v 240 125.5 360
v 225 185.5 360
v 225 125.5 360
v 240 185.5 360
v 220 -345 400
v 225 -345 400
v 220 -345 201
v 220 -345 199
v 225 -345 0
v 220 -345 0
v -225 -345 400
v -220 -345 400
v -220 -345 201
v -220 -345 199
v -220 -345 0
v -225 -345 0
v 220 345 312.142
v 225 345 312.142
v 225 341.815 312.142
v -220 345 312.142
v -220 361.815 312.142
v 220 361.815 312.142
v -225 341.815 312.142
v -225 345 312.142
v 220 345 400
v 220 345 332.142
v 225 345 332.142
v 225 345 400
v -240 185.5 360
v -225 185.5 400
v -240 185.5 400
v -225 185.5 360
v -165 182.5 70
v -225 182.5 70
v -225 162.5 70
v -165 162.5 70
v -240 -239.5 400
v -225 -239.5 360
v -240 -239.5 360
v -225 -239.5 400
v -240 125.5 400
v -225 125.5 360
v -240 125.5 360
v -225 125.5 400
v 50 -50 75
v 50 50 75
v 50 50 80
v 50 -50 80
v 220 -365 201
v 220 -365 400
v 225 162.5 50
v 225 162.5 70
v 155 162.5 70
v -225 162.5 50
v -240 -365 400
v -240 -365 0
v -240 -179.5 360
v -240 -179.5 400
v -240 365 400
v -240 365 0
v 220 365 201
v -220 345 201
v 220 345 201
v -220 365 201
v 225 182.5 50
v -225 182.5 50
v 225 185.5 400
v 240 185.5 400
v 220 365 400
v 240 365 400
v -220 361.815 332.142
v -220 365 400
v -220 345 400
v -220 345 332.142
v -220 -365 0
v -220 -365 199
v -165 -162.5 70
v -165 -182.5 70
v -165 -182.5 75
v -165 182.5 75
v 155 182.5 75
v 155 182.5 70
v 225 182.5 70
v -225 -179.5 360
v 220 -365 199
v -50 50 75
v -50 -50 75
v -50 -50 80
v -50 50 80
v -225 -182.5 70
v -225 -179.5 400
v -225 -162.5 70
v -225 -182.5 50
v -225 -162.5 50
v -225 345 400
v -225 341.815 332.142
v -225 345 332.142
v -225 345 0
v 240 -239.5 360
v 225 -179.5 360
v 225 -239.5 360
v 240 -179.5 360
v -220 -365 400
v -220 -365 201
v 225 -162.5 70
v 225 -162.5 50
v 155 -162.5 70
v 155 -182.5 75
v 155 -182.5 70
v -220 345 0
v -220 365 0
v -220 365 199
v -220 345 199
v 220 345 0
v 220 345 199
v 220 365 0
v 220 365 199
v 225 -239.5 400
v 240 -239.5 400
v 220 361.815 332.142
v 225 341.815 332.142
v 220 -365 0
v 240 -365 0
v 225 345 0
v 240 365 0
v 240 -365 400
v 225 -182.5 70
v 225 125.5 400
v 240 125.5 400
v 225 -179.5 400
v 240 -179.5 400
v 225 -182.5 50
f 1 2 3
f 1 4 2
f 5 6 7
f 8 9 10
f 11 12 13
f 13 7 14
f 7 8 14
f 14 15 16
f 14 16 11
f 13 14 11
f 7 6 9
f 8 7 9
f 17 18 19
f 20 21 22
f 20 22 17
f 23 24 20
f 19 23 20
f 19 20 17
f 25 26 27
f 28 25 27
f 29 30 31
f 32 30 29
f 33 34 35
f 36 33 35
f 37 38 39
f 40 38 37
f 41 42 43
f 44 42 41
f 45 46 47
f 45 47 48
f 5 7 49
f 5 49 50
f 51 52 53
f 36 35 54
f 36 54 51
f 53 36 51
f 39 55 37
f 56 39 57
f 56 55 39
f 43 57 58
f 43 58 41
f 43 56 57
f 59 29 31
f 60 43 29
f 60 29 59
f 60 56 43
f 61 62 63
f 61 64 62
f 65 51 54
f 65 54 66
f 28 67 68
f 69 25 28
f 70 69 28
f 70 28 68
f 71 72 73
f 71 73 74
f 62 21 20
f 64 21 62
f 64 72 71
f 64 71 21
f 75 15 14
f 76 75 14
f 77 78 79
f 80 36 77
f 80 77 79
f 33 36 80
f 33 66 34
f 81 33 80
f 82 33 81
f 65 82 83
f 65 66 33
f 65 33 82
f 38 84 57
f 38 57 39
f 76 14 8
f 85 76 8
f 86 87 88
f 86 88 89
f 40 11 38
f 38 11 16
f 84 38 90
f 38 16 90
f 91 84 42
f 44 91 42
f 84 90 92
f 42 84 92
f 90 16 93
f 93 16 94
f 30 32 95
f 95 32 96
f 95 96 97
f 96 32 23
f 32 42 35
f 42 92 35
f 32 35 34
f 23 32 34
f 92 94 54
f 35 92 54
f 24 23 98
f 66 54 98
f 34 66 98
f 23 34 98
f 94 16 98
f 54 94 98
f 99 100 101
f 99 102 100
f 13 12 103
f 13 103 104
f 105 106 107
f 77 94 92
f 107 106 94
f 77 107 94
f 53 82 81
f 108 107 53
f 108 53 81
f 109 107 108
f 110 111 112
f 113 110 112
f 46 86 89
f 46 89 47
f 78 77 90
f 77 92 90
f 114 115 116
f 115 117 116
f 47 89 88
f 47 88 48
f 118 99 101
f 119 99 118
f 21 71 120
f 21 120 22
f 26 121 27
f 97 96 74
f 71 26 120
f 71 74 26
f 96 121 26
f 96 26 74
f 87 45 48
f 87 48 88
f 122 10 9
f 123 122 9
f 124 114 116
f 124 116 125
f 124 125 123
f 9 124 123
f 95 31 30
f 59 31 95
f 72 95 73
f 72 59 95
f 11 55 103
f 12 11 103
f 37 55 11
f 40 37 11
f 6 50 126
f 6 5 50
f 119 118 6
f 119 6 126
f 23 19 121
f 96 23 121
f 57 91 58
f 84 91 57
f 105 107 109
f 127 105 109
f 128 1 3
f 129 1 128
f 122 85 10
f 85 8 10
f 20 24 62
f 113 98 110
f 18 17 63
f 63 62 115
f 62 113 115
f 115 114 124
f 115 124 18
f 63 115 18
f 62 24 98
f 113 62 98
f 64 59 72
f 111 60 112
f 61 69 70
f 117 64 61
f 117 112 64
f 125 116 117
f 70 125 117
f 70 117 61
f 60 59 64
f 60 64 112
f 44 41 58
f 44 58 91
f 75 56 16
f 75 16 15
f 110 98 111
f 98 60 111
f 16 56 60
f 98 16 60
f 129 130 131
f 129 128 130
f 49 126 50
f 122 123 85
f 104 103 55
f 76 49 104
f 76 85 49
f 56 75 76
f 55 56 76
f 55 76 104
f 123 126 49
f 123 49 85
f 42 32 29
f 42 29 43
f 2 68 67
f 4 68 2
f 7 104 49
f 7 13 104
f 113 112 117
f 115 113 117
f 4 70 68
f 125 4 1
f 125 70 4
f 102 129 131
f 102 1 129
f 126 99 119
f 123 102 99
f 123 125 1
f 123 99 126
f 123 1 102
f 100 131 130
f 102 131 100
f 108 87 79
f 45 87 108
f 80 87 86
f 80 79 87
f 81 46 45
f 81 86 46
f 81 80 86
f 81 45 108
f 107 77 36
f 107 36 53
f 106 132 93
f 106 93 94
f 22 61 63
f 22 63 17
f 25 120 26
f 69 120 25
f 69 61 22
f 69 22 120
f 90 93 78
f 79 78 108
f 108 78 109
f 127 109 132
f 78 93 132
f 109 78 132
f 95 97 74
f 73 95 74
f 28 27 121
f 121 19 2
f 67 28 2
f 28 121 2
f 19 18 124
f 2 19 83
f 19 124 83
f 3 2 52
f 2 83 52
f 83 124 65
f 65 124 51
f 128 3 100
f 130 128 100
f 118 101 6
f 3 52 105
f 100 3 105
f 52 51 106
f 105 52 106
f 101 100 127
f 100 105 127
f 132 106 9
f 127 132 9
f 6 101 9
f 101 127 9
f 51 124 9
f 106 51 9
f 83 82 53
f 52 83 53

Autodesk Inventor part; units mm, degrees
ref_plane "YZ Plane" through (0, 0, 0) normal (1, 0, 0) x (0, 1, 0)
ref_plane "XZ Plane" through (0, 0, 0) normal (0, 1, 0) x (-1, 0, 0)
ref_plane "XY Plane" through (0, 0, 0) normal (0, 0, 1) x (1, 0, 0)
sketch "Sketch1" plane through (0, 0, 0) normal (0, 0, 1) x (1, 0, 0)
  line L0 (-240, 365) -> (240, 365)
  line L1 (240, 365) -> (240, -365)
  line L2 (240, -365) -> (-240, -365)
  line L3 (-240, -365) -> (-240, 365)
  line L4 (-225, 345) -> (225, 345)
  line L5 (225, 345) -> (225, -345)
  line L6 (225, -345) -> (-225, -345)
  line L7 (-225, -345) -> (-225, 345)
  point P0 (0, 0)
  dimension "d0" = 480
  dimension "d1" = 730
  dimension "d2" = 450
  dimension "d3" = 690
extrude "Extrusion1" add sketch "Sketch1" along normal blind 400
sketch "Sketch2" plane through (-240, 365, 0) normal (0, 1, 0) x (1, 0, 0)
  line L0 (20, 0) -> (20, -199)
  line L1 (20, 0) -> (219, 0) construction
  line L2 (20, -199) -> (460, -199)
  line L3 (460, -199) -> (460, 0)
  line L4 (15, 0) -> (465, 0) projected
  line L5 (465, -400) -> (15, -400) projected
  line L6 (20, -400) -> (20, -201)
  line L7 (15, 0) -> (15, -400) projected
  line L8 (20, -201) -> (460, -201)
  line L9 (20, -201) -> (460, -201) construction
  line L10 (460, -201) -> (460, -400)
  point P0 (240, 0)
extrude "Extrusion2" cut sketch "Sketch2" against normal blind 740 contours L4 L3 L2 L0
sketch "Sketch3" plane through (-240, 365, 400) normal (0, 1, 0) x (1, 0, 0)
  line L0 (20, 0) -> (20, 199)
  line L1 (20, 199) -> (460, 199)
  line L2 (460, 199) -> (460, 0)
  line L3 (15, 0) -> (465, 0) projected
  point P0 (240, 400)
  dimension "d15" = 199
  dimension "d16" = 440
extrude "Extrusion3" cut sketch "Sketch3" against normal blind 740
sketch "Sketch8" plane through (-225, -345, 0) normal (1, 0, 0) x (0, 0, -1)
  line L0 (-50, 527.5) -> (-70, 527.5)
  line L1 (-70, 527.5) -> (-70, 507.5)
  line L2 (-70, 507.5) -> (-50, 507.5)
  line L3 (-50, 507.5) -> (-50, 527.5)
  point P0 (0, 345)
  point P1 (0, 345)
extrude "Extrusion6" add sketch "Sketch8" along normal blind 460
sketch "Sketch9" plane through (-225, -345, 0) normal (1, 0, 0) x (0, 0, -1)
  line L0 (-50, 182.5) -> (-70, 182.5)
  line L1 (-70, 182.5) -> (-70, 162.5)
  line L2 (-70, 162.5) -> (-50, 162.5)
  line L3 (-50, 162.5) -> (-50, 182.5)
  point P0 (0, 345)
extrude "Extrusion7" add sketch "Sketch9" along normal blind 460
sketch "Sketch11" plane through (240, -365, 0) normal (1, 0, 0) x (0, 0, -1)
  line L0 (-400, 730) -> (-400, 0) projected
  line L1 (-400, 20) -> (-400, 710) projected
  line L2 (-400, 185.5) -> (-360, 185.5)
  line L3 (-360, 185.5) -> (-360, 125.5)
  line L4 (-360, 125.5) -> (-400, 125.5)
  line L5 (-400, 125.5) -> (-400, 185.5)
  point P0 (0, 365)
  point P1 (-400, 365)
extrude "Extrusion8" cut sketch "Sketch11" against normal blind 500
sketch "Sketch12" plane through (240, -365, 0) normal (1, 0, 0) x (0, 0, -1)
  line L0 (-400, 710) -> (-400, 185.5) projected
  line L1 (-400, 550.5) -> (-360, 550.5)
  line L2 (-360, 550.5) -> (-360, 490.5)
  line L3 (-360, 490.5) -> (-400, 490.5)
  line L4 (-400, 490.5) -> (-400, 550.5)
  point P0 (0, 365)
  point P1 (-400, 365)
extrude "Extrusion9" cut sketch "Sketch12" against normal blind 500
sketch "Sketch13" plane through (240, -365, 0) normal (1, 0, 0) x (0, 0, -1)
  line L0 (-360, 490.5) -> (-360, 550.5) projected
  point P0 (0, 365)
sketch "Sketch14" plane through (240, -365, 0) normal (1, 0, 0) x (0, 0, -1)
  point P0 (0, 365)
sketch "Sketch15" plane through (240, -365, 0) normal (1, 0, 0) x (0, 0, -1)
  point P0 (0, 365)
sketch "Sketch16" plane through (240, -365, 0) normal (1, 0, 0) x (0, 0, -1)
  point P0 (0, 365)
sketch "Sketch17" plane through (-225, -345, 0) normal (1, 0, 0) x (0, 0, -1)
  line L0 (-332.1423, 706.8149) -> (-312.1423, 706.8149)
  line L1 (-312.1423, 706.8149) -> (-312.1423, 686.8149)
  line L2 (-312.1423, 686.8149) -> (-332.1423, 686.8149)
  line L3 (-332.1423, 686.8149) -> (-332.1423, 706.8149)
  point P0 (0, 345)
  dimension "d43" = 20
  dimension "d44" = 20
extrude "Extrusion10" add sketch "Sketch17" along normal blind 450
sketch "Sketch18" plane through (-225, 162.5, 70) normal (0, 0, 1) x (1, 0, 0)
  line L0 (0, 20) -> (450, 20) projected
  line L1 (0, -345) -> (450, -345) projected
  line L2 (60, 20) -> (380, 20)
  line L3 (380, 20) -> (380, -345)
  line L4 (380, -345) -> (60, -345)
  line L5 (60, -345) -> (60, 20)
  point P0 (225, -162.5)
  dimension "d47" = 320
extrude "Extrusion11" add sketch "Sketch18" along normal blind 5
sketch "Sketch19" plane through (-225, 162.5, 75) normal (0, 0, 1) x (1, 0, 0)
  line L0 (175, -112.5) -> (275, -112.5)
  line L1 (275, -112.5) -> (275, -212.5)
  line L2 (275, -212.5) -> (175, -212.5)
  line L3 (175, -212.5) -> (175, -112.5)
  point P0 (225, -162.5)
  dimension "d50" = 100
  dimension "d51" = 100
extrude "Extrusion12" add sketch "Sketch19" along normal blind 5
sketch "Sketch20" plane through (-225, 162.5, 80) normal (0, 0, 1) x (1, 0, 0)
  circle A0 centre (200, -162.5) radius 5.5
  point P0 (225, -162.5)
  dimension "d54" = 11
sketch "Sketch21" plane through (-225, 162.5, 80) normal (0, 0, 1) x (1, 0, 0)
  circle A0 centre (250, -162.5) radius 5.5
  point P0 (225, -162.5)
  dimension "d57" = 11
properties part number "stand2.0"
